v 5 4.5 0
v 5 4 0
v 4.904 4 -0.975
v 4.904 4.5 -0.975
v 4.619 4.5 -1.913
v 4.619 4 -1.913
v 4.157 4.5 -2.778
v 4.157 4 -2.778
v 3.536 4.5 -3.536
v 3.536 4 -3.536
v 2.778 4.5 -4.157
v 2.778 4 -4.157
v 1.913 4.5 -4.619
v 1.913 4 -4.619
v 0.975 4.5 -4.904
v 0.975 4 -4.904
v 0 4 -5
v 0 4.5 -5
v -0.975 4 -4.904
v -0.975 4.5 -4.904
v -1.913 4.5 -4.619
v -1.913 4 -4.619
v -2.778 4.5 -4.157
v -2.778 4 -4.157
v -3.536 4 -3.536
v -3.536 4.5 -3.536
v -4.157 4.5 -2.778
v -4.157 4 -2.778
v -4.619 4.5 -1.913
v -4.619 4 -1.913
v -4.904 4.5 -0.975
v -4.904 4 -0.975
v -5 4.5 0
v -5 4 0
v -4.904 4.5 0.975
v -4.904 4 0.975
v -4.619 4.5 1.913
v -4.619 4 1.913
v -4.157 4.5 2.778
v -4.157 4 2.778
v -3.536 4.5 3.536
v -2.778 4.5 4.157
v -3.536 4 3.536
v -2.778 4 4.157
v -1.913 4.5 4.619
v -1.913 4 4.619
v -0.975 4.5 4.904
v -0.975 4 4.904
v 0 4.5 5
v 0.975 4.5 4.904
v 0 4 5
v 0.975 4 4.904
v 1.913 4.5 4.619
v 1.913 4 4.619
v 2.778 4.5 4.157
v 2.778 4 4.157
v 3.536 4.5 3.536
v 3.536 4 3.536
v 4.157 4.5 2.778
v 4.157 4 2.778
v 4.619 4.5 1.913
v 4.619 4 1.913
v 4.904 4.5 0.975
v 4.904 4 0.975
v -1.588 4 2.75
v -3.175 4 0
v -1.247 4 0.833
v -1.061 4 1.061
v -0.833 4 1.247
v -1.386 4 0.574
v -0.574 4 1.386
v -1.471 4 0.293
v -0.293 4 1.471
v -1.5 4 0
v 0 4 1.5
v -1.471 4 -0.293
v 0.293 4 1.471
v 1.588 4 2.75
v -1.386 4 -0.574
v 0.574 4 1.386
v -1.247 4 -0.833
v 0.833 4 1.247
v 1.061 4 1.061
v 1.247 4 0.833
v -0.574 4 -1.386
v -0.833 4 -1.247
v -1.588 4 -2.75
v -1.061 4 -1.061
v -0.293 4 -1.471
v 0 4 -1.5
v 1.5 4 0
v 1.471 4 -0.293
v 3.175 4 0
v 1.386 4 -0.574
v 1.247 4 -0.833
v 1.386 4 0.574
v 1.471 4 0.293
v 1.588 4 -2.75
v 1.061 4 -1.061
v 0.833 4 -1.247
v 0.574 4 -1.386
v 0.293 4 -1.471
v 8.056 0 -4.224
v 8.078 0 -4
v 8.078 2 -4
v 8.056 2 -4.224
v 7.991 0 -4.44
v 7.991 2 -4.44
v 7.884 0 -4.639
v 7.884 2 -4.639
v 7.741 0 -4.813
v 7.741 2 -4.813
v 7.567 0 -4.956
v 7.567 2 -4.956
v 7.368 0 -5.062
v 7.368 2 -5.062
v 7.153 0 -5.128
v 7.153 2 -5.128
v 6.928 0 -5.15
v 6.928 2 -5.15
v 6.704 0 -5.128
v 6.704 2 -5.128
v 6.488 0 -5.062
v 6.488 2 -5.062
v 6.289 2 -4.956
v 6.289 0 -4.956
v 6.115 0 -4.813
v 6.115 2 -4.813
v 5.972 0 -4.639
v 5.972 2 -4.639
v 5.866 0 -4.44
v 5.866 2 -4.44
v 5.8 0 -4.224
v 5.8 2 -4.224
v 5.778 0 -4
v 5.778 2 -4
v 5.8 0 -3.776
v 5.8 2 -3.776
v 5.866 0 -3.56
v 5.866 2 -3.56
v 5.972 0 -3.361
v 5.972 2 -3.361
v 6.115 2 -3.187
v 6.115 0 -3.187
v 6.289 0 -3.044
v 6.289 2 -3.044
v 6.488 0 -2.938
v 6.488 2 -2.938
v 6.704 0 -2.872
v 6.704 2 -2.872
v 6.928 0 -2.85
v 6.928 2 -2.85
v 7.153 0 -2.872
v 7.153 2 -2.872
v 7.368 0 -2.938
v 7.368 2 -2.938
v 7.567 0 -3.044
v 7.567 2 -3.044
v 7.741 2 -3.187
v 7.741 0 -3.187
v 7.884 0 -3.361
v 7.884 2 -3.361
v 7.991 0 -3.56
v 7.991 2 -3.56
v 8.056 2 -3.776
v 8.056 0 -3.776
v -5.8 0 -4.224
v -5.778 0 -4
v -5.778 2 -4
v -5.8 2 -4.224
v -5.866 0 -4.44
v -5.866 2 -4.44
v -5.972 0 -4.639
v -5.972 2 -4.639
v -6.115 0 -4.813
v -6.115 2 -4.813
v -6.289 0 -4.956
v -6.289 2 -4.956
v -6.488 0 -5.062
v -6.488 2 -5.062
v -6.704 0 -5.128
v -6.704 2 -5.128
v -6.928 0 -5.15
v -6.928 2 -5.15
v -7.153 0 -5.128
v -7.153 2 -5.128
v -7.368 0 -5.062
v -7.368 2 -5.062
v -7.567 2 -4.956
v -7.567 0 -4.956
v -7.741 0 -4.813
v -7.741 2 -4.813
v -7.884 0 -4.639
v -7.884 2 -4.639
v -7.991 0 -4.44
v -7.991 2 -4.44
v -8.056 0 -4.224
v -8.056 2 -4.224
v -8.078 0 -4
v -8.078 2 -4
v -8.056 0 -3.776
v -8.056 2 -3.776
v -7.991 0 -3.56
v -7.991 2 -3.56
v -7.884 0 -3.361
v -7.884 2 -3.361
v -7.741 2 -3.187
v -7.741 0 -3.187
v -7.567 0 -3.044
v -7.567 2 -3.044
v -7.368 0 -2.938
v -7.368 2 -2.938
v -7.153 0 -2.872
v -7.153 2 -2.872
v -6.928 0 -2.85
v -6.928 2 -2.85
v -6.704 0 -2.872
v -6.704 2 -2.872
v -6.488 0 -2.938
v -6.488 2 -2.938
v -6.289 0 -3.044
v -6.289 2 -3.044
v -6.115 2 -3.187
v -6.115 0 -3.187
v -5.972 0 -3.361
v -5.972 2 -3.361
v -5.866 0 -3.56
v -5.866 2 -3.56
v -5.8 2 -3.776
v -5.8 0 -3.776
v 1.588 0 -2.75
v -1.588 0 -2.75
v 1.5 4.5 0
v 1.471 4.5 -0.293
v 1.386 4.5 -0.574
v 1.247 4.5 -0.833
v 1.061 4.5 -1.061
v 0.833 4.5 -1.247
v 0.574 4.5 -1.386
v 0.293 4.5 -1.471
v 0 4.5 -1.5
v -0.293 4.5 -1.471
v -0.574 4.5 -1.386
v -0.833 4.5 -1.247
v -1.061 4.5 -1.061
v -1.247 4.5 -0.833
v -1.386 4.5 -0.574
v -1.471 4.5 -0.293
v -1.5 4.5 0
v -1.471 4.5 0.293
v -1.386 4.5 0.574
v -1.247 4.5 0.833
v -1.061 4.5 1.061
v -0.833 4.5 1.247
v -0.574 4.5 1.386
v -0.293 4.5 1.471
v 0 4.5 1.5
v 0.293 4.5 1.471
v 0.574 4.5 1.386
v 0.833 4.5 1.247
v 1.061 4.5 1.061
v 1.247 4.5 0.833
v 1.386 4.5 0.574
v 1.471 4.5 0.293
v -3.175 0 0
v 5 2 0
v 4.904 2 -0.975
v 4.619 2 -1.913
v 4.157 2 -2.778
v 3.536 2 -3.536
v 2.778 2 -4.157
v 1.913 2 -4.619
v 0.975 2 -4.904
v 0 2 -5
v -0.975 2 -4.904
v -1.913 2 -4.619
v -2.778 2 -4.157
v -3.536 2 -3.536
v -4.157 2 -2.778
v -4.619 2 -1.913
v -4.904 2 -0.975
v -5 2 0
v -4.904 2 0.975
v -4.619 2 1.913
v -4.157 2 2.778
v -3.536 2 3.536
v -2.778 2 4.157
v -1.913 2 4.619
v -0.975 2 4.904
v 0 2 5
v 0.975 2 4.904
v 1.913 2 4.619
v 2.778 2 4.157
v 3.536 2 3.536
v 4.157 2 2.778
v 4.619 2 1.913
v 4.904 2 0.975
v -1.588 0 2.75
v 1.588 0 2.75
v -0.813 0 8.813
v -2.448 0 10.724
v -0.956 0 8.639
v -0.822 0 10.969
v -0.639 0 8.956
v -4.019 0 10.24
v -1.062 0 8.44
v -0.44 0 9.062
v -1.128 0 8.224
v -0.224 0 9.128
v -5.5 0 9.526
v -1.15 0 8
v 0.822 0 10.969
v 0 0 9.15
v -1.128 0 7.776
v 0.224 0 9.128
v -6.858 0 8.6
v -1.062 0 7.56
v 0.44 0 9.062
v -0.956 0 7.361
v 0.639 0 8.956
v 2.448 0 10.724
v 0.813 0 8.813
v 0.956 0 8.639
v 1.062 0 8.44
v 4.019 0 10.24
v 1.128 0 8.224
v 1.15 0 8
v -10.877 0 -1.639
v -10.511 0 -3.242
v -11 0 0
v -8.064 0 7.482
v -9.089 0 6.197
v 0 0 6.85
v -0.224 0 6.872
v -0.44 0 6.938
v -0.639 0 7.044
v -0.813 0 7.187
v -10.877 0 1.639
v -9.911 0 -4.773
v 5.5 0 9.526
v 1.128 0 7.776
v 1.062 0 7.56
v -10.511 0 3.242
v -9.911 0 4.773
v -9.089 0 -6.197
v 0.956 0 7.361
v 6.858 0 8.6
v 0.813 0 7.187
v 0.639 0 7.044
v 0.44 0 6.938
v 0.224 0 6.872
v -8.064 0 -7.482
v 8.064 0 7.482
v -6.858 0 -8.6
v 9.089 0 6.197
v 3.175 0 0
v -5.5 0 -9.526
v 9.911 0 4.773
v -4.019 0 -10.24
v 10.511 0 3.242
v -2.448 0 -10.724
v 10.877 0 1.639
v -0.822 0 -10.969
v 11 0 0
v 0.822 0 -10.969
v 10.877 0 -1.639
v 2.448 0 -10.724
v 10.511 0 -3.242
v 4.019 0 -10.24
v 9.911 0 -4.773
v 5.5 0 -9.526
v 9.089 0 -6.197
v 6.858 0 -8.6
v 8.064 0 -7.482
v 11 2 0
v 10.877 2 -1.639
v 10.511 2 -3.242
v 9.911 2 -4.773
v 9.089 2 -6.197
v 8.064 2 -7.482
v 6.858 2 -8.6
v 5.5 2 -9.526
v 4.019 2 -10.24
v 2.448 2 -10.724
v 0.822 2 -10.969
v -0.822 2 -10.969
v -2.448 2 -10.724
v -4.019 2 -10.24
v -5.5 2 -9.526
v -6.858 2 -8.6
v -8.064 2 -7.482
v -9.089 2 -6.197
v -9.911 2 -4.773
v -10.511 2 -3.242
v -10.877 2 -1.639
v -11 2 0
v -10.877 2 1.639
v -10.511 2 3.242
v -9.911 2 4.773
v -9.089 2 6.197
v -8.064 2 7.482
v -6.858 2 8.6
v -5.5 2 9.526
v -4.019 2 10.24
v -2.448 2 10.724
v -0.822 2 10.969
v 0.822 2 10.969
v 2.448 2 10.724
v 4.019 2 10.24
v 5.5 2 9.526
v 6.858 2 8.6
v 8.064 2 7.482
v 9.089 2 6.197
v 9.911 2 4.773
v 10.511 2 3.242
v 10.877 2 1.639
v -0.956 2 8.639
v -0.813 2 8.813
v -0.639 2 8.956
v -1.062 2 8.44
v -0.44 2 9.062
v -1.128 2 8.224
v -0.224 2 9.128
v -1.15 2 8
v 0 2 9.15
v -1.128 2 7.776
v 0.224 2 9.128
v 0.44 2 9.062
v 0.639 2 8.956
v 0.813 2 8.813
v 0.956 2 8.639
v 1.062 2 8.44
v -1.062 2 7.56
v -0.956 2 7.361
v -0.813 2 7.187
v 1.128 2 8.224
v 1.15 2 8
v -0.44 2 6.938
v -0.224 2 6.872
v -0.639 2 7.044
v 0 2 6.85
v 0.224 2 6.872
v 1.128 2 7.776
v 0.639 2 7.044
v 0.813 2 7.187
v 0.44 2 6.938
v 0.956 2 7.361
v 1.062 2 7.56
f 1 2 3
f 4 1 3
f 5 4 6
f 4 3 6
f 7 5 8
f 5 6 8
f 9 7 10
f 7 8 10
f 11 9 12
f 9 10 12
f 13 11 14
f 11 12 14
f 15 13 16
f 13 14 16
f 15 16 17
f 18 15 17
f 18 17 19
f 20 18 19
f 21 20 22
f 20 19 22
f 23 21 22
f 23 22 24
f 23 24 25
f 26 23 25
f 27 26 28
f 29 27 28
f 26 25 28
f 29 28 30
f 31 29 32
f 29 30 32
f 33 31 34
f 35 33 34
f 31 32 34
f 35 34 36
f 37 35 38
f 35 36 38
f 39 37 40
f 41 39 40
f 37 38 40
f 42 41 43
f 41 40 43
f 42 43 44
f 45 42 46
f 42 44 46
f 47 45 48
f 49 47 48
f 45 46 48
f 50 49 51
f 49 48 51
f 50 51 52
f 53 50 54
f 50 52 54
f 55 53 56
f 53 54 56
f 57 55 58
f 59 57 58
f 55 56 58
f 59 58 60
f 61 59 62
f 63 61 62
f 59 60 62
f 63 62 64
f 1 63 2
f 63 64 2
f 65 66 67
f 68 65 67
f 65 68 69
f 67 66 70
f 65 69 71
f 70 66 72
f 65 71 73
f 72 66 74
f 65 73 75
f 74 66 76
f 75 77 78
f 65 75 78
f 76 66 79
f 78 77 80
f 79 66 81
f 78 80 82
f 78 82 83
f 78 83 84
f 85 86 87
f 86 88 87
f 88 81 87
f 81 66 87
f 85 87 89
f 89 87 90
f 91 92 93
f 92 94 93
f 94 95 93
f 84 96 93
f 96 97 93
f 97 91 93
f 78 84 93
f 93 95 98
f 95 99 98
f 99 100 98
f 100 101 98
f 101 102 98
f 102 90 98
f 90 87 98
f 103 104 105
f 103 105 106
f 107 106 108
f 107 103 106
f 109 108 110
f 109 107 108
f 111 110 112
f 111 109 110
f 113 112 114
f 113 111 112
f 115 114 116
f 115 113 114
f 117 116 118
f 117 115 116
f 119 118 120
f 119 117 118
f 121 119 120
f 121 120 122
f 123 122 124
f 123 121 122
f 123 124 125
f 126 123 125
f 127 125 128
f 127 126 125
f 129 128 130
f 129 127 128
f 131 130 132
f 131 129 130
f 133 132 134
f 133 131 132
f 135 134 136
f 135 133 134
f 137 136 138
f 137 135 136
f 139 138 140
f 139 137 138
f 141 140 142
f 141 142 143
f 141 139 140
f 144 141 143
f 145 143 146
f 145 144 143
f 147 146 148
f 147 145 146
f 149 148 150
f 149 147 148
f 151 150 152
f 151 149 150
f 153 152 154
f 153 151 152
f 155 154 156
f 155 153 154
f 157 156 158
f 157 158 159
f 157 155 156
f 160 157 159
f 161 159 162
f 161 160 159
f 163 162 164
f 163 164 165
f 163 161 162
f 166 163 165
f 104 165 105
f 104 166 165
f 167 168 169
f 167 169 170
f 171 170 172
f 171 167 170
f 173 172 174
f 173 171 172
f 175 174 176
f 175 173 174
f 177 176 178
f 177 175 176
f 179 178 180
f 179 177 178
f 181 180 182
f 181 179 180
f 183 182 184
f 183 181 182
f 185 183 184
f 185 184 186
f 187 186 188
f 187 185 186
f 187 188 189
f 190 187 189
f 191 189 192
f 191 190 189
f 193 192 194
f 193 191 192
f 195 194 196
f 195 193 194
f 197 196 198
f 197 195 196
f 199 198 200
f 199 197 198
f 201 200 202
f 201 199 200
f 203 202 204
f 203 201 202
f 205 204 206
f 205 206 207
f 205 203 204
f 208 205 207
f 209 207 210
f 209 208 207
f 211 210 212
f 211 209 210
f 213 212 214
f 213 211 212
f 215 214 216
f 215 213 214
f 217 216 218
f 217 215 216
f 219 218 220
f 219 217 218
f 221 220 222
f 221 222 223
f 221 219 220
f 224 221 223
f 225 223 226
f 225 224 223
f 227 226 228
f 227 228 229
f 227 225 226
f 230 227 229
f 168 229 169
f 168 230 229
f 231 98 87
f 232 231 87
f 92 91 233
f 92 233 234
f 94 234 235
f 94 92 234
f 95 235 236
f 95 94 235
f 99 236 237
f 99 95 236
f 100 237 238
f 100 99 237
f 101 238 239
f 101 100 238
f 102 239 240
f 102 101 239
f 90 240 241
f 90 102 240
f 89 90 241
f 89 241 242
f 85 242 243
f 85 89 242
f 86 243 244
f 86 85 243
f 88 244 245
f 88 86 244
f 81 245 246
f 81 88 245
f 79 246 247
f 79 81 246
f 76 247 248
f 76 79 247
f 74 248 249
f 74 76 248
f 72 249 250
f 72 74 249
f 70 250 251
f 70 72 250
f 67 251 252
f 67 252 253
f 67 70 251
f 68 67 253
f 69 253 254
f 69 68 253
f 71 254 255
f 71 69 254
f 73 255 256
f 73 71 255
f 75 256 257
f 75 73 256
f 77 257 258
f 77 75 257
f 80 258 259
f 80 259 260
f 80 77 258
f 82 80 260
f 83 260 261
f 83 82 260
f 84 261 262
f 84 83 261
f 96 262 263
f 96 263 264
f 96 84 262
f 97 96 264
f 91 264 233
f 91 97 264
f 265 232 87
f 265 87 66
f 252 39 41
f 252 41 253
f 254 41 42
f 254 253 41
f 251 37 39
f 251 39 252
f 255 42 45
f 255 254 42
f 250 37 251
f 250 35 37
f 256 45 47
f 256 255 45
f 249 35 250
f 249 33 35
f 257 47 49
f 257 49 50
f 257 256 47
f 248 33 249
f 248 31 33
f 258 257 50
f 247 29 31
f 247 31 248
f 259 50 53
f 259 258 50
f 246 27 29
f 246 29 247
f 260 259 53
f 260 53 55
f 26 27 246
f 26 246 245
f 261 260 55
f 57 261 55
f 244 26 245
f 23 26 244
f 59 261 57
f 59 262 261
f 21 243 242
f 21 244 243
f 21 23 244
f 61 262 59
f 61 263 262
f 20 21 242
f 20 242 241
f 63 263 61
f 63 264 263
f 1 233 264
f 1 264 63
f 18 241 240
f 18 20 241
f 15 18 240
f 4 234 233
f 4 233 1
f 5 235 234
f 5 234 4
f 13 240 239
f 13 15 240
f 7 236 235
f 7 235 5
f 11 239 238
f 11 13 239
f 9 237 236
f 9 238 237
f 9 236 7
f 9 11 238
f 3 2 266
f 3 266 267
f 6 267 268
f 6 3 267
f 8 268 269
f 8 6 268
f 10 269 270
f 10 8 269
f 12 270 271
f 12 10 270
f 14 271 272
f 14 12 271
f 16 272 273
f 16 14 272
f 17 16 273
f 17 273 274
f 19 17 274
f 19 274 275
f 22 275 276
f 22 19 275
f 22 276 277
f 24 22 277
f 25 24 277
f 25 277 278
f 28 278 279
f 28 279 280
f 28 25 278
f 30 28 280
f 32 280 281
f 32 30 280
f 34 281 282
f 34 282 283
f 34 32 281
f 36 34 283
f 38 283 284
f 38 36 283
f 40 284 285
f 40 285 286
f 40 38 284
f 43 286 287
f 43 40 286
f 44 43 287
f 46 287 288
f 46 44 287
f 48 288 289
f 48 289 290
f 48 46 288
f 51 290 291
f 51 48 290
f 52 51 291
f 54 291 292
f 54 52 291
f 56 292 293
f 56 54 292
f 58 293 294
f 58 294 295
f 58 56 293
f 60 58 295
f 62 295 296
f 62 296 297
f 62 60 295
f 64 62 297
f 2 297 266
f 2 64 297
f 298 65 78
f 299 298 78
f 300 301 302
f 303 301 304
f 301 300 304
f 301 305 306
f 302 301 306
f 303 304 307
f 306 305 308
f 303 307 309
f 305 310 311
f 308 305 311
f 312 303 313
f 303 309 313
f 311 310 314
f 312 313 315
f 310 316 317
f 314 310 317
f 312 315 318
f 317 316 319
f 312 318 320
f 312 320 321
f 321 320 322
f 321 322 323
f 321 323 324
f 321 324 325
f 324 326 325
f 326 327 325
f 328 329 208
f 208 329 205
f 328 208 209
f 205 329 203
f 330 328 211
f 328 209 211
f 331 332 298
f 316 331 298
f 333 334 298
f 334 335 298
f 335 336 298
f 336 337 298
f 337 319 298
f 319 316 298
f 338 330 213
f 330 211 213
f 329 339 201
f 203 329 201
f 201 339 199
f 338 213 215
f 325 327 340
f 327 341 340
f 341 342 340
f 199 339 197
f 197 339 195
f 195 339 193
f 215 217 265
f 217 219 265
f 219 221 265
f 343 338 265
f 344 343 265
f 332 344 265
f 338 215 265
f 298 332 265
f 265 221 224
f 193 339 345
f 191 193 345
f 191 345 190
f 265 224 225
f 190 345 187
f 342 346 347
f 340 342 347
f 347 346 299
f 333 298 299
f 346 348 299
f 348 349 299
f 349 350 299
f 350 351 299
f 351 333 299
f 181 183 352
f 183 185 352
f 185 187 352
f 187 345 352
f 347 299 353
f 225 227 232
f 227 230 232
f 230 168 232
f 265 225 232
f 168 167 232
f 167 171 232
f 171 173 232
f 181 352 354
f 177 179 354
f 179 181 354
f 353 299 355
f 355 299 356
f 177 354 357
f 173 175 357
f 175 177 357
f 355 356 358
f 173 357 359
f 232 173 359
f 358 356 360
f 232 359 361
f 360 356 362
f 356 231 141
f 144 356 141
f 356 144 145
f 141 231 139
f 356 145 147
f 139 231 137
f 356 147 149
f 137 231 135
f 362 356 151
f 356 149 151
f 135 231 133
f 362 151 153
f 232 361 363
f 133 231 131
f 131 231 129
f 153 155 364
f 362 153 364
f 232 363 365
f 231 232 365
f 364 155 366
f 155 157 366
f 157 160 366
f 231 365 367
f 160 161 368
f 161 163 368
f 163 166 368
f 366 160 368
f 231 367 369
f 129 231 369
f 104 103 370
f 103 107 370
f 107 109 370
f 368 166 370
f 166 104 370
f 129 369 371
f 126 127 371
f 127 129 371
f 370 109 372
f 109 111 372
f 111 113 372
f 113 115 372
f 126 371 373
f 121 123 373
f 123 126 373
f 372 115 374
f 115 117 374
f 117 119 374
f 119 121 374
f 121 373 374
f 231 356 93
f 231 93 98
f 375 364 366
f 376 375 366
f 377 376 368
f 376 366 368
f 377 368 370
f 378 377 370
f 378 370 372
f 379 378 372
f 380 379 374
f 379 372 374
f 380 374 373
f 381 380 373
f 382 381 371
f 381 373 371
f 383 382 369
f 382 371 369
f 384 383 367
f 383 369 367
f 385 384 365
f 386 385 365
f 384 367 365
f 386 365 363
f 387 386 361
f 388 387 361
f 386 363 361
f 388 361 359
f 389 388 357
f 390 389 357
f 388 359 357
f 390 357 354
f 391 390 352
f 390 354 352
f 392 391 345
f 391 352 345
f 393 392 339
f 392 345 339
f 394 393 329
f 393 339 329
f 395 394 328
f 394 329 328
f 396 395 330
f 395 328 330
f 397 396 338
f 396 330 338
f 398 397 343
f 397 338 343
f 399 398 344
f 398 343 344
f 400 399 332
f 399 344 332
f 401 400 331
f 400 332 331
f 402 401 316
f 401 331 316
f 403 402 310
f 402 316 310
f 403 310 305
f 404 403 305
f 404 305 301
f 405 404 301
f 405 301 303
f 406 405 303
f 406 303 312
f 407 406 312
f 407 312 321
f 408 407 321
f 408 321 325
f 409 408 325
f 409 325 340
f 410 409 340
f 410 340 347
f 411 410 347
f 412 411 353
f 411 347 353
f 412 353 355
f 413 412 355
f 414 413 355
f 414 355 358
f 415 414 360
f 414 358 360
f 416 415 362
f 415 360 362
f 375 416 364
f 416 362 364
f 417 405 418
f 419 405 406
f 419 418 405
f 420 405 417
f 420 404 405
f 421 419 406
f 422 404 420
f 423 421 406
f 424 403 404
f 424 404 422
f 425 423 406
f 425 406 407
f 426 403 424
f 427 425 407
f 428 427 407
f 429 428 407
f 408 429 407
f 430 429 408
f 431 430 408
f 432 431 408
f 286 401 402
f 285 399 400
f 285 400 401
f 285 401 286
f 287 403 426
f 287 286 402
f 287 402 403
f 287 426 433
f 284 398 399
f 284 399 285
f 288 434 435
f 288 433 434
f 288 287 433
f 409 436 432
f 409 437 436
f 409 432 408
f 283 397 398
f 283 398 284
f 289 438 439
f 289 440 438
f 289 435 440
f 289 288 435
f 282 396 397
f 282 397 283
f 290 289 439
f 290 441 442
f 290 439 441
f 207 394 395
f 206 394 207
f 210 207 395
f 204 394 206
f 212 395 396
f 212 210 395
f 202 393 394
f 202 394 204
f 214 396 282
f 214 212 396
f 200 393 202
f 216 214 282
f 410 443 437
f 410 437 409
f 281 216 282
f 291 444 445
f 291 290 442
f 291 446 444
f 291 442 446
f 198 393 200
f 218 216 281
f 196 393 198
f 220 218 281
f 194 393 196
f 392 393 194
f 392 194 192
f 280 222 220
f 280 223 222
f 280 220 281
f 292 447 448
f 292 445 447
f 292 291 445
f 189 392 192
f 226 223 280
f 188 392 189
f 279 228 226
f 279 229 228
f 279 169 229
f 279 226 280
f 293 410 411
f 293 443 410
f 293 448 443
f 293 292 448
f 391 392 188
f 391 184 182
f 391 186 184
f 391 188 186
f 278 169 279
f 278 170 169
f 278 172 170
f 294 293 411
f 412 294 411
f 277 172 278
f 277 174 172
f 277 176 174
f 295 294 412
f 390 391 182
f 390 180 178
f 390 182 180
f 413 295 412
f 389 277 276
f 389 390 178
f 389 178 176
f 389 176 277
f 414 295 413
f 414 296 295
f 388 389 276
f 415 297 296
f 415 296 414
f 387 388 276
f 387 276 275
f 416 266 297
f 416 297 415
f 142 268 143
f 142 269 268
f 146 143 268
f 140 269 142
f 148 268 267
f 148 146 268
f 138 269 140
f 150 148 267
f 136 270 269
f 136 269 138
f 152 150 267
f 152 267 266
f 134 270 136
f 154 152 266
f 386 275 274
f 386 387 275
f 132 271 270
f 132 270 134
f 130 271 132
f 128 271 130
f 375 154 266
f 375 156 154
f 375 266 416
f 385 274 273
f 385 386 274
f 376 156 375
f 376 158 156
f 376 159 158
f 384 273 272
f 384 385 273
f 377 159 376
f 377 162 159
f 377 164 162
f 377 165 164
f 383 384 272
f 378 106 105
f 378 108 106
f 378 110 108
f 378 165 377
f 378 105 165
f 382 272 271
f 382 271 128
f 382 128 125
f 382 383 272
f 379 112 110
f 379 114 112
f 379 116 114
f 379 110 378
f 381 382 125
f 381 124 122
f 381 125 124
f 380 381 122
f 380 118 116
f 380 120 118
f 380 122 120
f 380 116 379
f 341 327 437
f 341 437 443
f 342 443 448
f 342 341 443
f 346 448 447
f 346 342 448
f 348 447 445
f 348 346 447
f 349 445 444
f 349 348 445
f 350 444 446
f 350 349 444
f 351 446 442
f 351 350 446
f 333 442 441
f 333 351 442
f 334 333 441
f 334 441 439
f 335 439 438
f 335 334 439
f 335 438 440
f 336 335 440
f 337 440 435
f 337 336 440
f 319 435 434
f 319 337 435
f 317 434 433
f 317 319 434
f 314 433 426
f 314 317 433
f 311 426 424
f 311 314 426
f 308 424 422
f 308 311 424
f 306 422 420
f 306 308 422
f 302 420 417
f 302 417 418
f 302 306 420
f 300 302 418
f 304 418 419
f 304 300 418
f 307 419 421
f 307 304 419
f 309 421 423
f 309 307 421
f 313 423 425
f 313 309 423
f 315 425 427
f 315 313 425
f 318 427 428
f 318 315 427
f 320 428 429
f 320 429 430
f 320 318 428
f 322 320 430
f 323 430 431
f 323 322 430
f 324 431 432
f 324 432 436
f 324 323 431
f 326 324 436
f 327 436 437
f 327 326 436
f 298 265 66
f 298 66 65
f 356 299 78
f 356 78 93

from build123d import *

# Parameters (mm, degrees)
SKETCH1_R           = 11
SKETCH1_R_2         = 1.15
BOSS_EXTRUDE1_DEPTH = 2
SKETCH3_R           = 5
BOSS_EXTRUDE3_DEPTH = 2
SKETCH4_R           = 5
SKETCH4_R_2         = 1.5
BOSS_EXTRUDE4_DEPTH = 0.5


with BuildPart() as part:
    # Sketch1 → Boss-Extrude1 (new body)
    with BuildSketch(Plane(origin=(0, 0, 0), x_dir=(1, 0, 0), z_dir=(0, 1, 0))):
        Circle(SKETCH1_R)
        with Locations((0, -8)):
            Circle(SKETCH1_R_2, mode=Mode.SUBTRACT)
        with Locations((-6.92820323, 4)):
            Circle(SKETCH1_R_2, mode=Mode.SUBTRACT)
        with Locations((6.92820323, 4)):
            Circle(SKETCH1_R_2, mode=Mode.SUBTRACT)
        Polygon((3.175426481, 0), (1.58771324, 2.75), (-1.58771324, 2.75), (-3.175426481, 0), (-1.58771324, -2.75), (1.58771324, -2.75), align=None, mode=Mode.SUBTRACT)
    extrude(amount=BOSS_EXTRUDE1_DEPTH)

    # Sketch3 → Boss-Extrude3 (add, symmetric)
    with BuildSketch(Plane(origin=(0, 2, 0), x_dir=(1, 0, 0), z_dir=(0, 1, 0))):
        Circle(SKETCH3_R)
        Polygon((3.175426481, 0), (1.58771324, 2.75), (-1.58771324, 2.75), (-3.175426481, 0), (-1.58771324, -2.75), (1.58771324, -2.75), align=None, mode=Mode.SUBTRACT)
    extrude(amount=BOSS_EXTRUDE3_DEPTH, both=True)

    # Sketch4 → Boss-Extrude4 (add)
    with BuildSketch(Plane(origin=(0, 4, 0), x_dir=(1, 0, 0), z_dir=(0, 1, 0))):
        Circle(SKETCH4_R)
        Circle(SKETCH4_R_2, mode=Mode.SUBTRACT)
    extrude(amount=BOSS_EXTRUDE4_DEPTH)


solid = part.part
